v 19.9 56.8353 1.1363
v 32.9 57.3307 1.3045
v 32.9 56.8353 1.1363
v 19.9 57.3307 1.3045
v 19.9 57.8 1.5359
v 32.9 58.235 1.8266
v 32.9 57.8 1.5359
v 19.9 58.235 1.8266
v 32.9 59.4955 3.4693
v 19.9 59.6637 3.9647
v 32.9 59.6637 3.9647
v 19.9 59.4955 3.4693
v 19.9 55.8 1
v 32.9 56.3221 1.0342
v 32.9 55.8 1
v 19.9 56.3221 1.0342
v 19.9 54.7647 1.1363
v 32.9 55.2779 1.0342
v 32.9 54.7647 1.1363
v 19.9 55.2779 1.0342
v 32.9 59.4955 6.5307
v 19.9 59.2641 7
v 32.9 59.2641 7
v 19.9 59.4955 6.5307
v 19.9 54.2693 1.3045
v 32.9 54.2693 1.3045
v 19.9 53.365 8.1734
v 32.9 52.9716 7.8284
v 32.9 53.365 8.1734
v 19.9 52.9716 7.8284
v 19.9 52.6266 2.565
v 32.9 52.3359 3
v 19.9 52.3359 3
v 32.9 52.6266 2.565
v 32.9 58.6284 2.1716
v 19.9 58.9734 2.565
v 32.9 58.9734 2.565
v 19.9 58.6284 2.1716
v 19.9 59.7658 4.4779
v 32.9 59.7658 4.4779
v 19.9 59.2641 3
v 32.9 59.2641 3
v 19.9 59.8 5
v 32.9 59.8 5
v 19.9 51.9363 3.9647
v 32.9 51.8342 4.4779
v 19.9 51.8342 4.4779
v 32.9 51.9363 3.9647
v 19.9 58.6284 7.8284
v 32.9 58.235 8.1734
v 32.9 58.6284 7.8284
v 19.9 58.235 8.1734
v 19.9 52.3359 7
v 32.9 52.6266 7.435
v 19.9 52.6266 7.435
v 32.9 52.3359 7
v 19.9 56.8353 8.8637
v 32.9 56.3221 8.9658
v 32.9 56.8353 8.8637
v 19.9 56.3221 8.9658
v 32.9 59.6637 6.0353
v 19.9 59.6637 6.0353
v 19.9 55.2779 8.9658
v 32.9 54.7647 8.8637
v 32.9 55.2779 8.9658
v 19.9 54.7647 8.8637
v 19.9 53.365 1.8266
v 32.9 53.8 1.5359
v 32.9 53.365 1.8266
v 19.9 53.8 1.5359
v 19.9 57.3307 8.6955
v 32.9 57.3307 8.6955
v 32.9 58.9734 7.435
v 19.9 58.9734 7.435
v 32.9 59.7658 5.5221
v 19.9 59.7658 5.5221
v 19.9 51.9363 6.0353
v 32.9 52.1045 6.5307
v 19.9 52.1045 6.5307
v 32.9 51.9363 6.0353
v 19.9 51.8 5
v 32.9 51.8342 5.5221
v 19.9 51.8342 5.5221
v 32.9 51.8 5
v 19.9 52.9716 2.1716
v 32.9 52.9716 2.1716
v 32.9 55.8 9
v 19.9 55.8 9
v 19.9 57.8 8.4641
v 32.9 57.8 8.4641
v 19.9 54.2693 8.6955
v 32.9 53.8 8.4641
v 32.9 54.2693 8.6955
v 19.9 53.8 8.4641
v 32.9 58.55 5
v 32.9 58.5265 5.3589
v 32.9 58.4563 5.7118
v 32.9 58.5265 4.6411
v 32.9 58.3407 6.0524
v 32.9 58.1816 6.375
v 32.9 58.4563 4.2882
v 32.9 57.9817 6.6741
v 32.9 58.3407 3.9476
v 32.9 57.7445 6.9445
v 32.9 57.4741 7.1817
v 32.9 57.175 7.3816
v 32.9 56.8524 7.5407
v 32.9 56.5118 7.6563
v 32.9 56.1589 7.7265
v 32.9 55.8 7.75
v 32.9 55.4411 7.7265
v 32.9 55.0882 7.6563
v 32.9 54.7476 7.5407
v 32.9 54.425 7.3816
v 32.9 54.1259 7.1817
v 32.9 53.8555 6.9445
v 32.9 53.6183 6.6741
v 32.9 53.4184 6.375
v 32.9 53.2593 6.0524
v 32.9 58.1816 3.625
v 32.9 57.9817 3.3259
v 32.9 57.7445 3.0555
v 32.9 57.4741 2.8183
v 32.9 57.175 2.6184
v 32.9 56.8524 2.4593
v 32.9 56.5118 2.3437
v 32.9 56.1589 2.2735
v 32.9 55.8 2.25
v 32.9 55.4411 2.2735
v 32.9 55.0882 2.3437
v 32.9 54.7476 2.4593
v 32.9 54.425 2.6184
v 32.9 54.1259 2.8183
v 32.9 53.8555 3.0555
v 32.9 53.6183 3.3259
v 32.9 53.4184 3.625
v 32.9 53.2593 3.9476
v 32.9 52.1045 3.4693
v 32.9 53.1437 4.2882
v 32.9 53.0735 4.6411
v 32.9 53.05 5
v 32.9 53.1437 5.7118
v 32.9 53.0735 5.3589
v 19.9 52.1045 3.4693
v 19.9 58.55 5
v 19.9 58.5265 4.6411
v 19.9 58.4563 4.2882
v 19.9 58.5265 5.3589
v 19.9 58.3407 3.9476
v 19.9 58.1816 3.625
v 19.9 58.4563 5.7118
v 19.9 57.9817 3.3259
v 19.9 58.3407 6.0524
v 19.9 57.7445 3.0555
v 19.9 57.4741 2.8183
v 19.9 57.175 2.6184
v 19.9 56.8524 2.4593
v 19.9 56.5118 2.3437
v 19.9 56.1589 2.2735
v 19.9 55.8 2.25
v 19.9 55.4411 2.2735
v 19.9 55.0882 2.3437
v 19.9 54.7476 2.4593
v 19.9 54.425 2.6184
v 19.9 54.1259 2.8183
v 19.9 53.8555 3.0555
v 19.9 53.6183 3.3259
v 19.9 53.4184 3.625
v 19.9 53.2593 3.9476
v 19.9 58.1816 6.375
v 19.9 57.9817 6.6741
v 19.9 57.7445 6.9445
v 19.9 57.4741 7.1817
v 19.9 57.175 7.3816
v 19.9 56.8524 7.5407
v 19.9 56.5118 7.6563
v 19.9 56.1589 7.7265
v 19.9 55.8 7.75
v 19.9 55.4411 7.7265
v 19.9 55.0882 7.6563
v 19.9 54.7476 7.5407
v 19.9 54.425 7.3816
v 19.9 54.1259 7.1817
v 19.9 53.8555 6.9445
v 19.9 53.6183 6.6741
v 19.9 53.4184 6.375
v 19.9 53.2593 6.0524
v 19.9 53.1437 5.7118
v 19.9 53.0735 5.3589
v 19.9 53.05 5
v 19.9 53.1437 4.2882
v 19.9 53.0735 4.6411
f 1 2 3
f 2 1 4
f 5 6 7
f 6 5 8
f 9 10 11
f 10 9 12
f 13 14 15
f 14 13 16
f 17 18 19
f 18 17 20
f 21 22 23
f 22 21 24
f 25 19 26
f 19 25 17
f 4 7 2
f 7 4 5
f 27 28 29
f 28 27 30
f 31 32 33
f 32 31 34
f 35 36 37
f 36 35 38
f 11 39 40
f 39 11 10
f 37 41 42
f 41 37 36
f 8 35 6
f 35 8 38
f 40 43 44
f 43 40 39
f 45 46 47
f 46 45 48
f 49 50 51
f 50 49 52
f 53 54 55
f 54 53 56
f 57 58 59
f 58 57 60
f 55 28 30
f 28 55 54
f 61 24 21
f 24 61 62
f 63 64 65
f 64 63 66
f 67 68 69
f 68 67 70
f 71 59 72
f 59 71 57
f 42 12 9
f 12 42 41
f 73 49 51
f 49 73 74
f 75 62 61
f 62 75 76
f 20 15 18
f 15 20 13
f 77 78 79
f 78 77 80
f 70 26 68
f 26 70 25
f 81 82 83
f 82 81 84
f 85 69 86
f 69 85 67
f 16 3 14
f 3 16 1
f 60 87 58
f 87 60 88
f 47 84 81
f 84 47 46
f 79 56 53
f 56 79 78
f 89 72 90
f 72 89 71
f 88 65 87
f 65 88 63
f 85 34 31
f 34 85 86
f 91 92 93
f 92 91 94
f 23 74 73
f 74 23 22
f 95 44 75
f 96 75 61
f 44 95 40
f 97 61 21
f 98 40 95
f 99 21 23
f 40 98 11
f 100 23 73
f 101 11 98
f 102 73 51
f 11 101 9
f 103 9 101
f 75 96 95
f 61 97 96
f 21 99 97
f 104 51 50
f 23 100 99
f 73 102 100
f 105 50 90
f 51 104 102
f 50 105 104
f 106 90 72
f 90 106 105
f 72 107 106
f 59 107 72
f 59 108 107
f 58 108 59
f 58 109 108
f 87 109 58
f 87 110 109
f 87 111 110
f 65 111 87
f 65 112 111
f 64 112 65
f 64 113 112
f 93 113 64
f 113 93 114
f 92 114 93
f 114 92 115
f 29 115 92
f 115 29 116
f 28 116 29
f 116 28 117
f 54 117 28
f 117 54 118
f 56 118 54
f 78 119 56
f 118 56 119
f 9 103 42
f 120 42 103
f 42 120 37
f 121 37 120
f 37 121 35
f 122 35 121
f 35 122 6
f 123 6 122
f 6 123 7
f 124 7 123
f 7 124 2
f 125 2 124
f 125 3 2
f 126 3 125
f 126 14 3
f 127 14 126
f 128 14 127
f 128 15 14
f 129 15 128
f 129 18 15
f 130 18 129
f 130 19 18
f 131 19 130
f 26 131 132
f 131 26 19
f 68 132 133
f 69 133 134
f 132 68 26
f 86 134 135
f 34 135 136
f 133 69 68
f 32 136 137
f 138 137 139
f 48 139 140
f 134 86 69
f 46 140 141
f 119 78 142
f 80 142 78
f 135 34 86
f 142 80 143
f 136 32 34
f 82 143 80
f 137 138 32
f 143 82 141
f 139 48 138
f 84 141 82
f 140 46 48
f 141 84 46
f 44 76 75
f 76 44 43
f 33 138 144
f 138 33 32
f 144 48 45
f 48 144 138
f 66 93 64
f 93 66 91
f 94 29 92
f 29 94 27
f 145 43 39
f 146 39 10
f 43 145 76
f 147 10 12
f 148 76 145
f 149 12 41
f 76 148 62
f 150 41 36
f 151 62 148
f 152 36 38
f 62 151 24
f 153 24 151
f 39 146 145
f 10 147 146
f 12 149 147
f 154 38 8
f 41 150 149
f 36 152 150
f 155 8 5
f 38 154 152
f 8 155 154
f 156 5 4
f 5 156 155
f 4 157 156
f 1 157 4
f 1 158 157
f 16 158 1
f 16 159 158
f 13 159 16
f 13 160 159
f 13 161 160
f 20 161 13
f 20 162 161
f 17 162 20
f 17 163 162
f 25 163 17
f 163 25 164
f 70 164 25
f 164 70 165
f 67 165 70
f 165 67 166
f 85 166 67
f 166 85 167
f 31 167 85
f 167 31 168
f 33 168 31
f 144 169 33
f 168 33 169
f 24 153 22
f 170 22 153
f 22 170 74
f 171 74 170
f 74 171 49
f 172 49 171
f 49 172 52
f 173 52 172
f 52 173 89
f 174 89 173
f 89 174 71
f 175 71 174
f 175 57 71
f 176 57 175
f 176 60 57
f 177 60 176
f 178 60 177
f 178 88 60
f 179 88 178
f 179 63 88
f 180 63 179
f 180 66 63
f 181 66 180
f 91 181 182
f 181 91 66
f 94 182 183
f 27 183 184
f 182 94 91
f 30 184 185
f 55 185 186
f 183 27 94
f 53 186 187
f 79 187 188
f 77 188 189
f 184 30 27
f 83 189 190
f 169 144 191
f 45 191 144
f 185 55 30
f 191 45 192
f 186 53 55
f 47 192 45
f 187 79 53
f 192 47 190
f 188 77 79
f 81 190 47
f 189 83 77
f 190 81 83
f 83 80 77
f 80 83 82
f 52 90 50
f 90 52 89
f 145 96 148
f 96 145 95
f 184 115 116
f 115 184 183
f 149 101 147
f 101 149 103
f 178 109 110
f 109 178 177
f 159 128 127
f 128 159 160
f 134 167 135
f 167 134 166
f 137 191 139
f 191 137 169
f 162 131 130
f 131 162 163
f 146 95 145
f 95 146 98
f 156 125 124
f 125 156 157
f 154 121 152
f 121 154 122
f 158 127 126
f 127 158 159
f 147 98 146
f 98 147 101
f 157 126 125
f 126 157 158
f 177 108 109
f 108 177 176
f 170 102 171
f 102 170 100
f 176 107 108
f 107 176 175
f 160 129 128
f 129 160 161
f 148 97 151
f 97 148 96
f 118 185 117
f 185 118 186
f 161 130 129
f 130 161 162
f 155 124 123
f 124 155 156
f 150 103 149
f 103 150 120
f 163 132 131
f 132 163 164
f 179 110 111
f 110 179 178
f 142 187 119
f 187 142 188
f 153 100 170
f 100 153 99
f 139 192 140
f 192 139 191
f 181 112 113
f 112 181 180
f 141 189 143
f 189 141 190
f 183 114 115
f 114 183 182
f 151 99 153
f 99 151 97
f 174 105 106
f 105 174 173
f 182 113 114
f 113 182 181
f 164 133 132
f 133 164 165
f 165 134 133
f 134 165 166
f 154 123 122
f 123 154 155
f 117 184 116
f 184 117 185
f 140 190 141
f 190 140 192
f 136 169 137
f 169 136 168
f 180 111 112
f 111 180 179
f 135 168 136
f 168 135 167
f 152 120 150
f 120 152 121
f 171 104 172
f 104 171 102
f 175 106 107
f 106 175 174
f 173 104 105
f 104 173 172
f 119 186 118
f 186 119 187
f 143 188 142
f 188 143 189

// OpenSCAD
$fn=48;
difference(){
 translate([19.9,55.8,5]) rotate([0,90,0]) cylinder(h=13,r=4);
 translate([18,55.8,5]) rotate([0,90,0]) cylinder(h=17,r=2.75);
}
